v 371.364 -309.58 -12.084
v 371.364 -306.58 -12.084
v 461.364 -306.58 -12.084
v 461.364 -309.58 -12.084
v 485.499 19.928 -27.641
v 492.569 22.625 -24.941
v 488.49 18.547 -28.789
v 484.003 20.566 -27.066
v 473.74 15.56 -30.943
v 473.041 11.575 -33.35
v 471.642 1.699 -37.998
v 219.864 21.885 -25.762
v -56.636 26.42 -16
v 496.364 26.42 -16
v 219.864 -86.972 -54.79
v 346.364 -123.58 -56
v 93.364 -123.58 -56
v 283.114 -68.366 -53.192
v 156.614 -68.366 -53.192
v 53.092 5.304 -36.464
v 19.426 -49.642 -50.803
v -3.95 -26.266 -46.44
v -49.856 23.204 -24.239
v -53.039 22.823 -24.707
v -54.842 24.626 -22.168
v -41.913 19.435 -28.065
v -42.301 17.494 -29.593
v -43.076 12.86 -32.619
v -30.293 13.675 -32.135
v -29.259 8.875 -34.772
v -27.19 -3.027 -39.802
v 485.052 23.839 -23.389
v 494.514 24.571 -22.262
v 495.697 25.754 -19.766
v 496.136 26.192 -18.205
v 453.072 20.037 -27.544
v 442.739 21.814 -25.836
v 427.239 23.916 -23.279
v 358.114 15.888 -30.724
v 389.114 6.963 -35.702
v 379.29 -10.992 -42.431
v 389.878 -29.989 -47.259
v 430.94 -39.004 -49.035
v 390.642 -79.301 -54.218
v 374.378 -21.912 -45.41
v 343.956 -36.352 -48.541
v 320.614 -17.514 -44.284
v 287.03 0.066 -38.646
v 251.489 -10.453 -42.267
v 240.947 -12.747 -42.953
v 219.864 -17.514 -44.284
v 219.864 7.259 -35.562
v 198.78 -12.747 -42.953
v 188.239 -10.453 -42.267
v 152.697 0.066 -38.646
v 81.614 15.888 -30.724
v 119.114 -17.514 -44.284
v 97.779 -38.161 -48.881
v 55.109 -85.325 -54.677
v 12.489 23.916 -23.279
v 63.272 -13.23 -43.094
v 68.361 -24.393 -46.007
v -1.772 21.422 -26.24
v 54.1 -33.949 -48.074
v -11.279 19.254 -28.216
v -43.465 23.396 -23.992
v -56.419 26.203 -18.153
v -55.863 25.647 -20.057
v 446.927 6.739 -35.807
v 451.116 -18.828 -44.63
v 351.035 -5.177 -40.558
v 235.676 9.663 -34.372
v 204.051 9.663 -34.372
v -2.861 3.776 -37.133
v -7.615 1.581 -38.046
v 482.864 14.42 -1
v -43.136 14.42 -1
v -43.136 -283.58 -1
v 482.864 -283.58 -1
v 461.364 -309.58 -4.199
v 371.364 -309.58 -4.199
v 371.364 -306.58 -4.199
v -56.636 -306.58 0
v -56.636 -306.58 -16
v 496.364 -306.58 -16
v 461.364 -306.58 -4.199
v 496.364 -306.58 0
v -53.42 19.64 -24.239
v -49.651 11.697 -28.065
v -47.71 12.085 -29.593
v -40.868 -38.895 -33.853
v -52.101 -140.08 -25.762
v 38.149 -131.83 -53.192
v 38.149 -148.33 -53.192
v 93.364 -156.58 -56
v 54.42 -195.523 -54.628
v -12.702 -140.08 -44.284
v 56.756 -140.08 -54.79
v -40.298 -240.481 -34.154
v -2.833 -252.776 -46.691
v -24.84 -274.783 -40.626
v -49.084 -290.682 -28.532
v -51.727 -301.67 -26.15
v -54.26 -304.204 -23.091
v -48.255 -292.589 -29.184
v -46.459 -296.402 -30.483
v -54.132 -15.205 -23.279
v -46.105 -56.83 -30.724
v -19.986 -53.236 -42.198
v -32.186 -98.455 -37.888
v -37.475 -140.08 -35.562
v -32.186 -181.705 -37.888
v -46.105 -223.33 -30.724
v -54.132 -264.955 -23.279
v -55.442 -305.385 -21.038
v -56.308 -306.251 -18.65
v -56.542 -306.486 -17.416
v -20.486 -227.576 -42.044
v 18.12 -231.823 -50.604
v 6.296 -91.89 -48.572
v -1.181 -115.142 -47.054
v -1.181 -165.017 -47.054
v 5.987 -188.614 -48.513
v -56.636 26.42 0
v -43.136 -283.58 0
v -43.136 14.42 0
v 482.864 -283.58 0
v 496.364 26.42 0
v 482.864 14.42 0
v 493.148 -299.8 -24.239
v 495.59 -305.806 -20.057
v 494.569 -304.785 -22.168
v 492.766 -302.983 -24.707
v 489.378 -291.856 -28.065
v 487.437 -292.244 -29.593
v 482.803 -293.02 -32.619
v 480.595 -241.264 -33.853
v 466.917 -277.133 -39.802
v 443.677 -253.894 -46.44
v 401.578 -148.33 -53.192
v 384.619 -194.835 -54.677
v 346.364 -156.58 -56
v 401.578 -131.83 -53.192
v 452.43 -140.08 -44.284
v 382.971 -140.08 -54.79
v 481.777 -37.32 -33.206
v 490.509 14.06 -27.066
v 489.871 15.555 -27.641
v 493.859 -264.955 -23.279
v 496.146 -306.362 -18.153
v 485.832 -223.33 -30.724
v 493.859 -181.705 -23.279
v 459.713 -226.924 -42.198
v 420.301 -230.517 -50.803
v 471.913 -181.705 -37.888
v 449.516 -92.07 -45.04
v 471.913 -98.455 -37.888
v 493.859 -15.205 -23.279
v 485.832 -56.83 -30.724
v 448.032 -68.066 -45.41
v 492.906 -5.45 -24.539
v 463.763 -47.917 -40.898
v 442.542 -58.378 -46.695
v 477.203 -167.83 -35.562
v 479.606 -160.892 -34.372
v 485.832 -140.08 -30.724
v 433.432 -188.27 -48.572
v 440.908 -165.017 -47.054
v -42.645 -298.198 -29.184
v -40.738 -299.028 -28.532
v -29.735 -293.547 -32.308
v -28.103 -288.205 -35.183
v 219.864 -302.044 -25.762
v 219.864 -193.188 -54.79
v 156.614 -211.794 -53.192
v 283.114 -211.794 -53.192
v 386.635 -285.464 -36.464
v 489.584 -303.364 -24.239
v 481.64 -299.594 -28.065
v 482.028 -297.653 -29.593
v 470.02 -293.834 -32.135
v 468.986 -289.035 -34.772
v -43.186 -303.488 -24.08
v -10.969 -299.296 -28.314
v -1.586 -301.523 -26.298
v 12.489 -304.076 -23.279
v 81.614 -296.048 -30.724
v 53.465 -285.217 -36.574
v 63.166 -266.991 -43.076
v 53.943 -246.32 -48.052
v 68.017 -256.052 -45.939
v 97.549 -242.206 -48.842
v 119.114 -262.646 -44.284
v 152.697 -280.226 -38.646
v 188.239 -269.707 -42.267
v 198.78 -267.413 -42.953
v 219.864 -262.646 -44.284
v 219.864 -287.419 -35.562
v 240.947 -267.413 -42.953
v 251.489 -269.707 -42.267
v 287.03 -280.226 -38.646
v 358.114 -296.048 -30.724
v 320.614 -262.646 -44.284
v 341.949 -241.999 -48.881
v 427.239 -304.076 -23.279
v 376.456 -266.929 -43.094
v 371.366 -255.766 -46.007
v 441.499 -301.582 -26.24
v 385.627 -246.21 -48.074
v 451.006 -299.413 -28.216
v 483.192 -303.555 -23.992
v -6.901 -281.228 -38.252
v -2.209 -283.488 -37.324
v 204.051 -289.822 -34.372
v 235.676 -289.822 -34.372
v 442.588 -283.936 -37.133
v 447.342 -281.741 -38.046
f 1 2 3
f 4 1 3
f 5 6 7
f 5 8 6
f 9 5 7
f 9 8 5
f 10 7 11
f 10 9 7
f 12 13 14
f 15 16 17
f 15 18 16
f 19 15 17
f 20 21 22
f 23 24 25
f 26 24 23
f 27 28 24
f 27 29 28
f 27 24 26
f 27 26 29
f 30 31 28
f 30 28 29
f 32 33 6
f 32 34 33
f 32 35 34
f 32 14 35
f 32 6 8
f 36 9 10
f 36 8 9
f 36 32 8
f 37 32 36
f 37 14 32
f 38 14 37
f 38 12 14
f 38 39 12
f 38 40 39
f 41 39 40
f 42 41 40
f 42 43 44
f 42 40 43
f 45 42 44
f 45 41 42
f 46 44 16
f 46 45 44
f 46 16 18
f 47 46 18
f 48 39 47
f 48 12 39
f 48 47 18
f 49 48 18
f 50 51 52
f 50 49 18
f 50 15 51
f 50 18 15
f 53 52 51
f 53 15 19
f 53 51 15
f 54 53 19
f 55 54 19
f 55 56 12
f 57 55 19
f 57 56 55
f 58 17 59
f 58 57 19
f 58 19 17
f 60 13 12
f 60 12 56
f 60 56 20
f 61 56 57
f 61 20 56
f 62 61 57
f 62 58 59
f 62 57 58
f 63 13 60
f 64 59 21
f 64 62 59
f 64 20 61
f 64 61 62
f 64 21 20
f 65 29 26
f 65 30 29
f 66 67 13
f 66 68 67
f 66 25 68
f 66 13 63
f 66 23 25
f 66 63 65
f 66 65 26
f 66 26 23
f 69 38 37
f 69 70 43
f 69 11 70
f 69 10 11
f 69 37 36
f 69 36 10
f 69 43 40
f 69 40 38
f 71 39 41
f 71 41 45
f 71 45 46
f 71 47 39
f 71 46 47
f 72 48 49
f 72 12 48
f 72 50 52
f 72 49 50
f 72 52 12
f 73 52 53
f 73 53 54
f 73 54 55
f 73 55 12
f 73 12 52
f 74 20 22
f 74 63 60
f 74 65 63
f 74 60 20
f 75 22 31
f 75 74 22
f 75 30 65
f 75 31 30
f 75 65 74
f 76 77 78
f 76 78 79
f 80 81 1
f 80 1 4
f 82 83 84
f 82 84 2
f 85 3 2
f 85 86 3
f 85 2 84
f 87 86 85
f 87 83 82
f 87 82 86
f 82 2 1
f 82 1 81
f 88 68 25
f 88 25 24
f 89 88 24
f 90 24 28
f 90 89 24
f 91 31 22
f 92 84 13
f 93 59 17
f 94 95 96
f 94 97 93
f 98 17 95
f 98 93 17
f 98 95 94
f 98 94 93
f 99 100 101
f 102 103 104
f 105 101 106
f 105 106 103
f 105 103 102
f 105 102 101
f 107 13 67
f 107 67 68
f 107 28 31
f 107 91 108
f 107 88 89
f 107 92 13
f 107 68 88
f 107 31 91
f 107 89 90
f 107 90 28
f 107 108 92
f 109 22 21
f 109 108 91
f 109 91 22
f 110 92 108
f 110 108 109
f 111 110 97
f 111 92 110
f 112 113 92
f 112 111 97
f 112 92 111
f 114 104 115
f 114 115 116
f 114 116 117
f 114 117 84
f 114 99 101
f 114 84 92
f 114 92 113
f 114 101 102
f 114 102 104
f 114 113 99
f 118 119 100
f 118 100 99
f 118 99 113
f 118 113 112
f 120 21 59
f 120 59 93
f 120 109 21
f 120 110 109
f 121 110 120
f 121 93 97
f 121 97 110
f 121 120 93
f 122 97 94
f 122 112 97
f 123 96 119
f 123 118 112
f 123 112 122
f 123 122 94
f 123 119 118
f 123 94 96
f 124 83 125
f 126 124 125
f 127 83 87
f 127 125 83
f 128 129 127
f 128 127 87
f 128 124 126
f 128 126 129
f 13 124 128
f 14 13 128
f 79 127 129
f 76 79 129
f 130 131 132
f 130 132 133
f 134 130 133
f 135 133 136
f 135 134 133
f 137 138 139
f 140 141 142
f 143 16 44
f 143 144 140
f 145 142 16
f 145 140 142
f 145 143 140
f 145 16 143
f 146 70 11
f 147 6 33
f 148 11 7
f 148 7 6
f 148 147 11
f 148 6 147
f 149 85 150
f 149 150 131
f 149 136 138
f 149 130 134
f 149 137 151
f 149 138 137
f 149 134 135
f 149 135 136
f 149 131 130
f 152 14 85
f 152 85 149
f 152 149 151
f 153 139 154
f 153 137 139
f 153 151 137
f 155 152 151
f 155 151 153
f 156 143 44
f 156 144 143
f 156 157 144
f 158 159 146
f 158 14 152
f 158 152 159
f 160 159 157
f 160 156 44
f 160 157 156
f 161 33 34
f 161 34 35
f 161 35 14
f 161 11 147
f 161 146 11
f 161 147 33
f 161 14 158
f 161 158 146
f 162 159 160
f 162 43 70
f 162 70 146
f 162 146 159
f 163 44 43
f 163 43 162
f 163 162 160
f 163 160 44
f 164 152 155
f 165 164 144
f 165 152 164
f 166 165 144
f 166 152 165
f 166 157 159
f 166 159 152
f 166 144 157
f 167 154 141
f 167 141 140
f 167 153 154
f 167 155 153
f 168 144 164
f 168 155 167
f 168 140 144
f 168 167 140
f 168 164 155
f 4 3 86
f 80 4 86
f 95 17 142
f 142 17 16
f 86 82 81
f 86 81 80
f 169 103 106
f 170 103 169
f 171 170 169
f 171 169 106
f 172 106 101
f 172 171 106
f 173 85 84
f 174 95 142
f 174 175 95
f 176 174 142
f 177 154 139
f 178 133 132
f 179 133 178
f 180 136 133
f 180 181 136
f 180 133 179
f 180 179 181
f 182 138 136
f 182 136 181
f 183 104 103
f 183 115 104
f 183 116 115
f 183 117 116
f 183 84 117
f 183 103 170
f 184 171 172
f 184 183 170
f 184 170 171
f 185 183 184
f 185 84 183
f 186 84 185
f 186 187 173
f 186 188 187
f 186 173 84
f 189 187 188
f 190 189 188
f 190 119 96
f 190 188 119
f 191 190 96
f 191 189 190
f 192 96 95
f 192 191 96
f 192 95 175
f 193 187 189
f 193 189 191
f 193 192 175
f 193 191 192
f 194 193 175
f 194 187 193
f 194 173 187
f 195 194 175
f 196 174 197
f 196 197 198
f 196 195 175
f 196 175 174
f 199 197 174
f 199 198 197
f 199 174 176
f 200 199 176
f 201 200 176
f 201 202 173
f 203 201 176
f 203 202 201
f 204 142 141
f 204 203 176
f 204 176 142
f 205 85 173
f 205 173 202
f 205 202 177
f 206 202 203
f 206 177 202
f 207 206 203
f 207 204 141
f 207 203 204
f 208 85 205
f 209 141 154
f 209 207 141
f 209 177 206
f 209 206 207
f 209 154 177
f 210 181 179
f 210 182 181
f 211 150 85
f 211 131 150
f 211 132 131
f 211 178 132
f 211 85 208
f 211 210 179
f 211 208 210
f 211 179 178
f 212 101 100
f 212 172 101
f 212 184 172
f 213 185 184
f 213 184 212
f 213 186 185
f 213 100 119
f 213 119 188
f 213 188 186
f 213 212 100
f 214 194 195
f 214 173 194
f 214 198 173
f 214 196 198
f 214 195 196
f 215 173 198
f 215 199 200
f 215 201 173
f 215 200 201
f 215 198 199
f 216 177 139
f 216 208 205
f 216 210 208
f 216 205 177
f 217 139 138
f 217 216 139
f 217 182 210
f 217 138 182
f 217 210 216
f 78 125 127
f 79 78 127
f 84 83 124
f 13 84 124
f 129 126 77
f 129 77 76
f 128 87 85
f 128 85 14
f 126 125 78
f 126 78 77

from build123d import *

# Parameters (mm, degrees)
SKETCH_1_W          = 553
SKETCH_1_H          = 333
EXTRUDE_1_DEPTH     = 56
FILLET_1_SIZE       = 40
FILLET_1_SIZE_2     = 150
SKETCH_2_W          = 526
SKETCH_2_H          = 298
CUT_EXTRUDE_1_DEPTH = 1
SKETCH_3_W          = 90
SKETCH_3_H          = 7.88506372
EXTRUDE_2_DEPTH     = 3


with BuildPart() as part:
    # Эскиз1 → Бобышка-Вытянуть1 (new body)
    with BuildSketch(Plane.XY):
        with Locations((219.863599641, -140.079802513)):
            Rectangle(SKETCH_1_W, SKETCH_1_H)
    extrude(amount=-EXTRUDE_1_DEPTH)

    # Скругление1
    # an asymmetric fillet: 150, 40 mm, written as the material it takes off along each edge
    with BuildSketch(Plane(origin=(496.363599641, -306.579802513, -56), x_dir=(0, 0, 1), z_dir=(-1, 0, 0)), Plane(origin=(-56.636400359, 26.420197487, -56), x_dir=(0, 0, 1), z_dir=(1, 0, 0))) as fillet_1_piece_1:
        with BuildLine():
            Bezier((FILLET_1_SIZE, 0), (0, 0), (0, FILLET_1_SIZE_2), weights=[1, 0.707106781, 1])
            Line((0, FILLET_1_SIZE_2), (-3, 150))
            Line((-3, 150), (-3, -3))
            Line((-3, -3), (40, -3))
            Line((40, -3), (FILLET_1_SIZE, 0))
        make_face()
    extrude(amount=553, mode=Mode.SUBTRACT)
    with BuildSketch(Plane(origin=(-56.636400359, -306.579802513, -56), x_dir=(0, 0, 1), z_dir=(0, 1, 0)), Plane(origin=(496.363599641, 26.420197487, -56), x_dir=(0, 0, 1), z_dir=(0, -1, 0))) as fillet_1_piece_2:
        with BuildLine():
            Bezier((FILLET_1_SIZE, 0), (0, 0), (0, FILLET_1_SIZE_2), weights=[1, 0.707106781, 1])
            Line((0, FILLET_1_SIZE_2), (-3, 150))
            Line((-3, 150), (-3, -3))
            Line((-3, -3), (40, -3))
            Line((40, -3), (FILLET_1_SIZE, 0))
        make_face()
    extrude(amount=333, mode=Mode.SUBTRACT)
    with BuildSketch(Plane(origin=(496.363599641, 26.420197487, -56), x_dir=(0, 0, 1), z_dir=(0, -1, 0))) as fillet_1_piece_3a_section:
        with BuildLine():
            Bezier((FILLET_1_SIZE, 0), (0, 0), (0, FILLET_1_SIZE_2), weights=[1, 0.707106781, 1])
            Line((0, FILLET_1_SIZE_2), (-3, 150))
            Line((-3, 150), (-3, -3))
            Line((-3, -3), (40, -3))
            Line((40, -3), (FILLET_1_SIZE, 0))
        make_face()
    fillet_1_piece_3a = extrude(amount=708, mode=Mode.PRIVATE)
    fillet_1_piece_3a = split(fillet_1_piece_3a, bisect_by=Plane(origin=(455.274079594, -306.579802513, -48.919820082), z_dir=(0, -1, 0)), keep=Keep.TOP, mode=Mode.PRIVATE)
    with BuildSketch(Plane(origin=(871.363599641, -306.579802513, -56), x_dir=(0, 0, 1), z_dir=(-1, 0, 0))) as fillet_1_piece_3b_section:
        with BuildLine():
            Bezier((FILLET_1_SIZE, 0), (0, 0), (0, FILLET_1_SIZE_2), weights=[1, 0.707106781, 1])
            Line((0, FILLET_1_SIZE_2), (-3, 150))
            Line((-3, 150), (-3, -3))
            Line((-3, -3), (40, -3))
            Line((40, -3), (FILLET_1_SIZE, 0))
        make_face()
    fillet_1_piece_3b = extrude(amount=928, mode=Mode.PRIVATE)
    fillet_1_piece_3b = split(fillet_1_piece_3b, bisect_by=Plane(origin=(496.363599641, -265.490295874, -48.919826396), z_dir=(1, 0, 0)), keep=Keep.TOP, mode=Mode.PRIVATE)
    fillet_1_piece_3 = fillet_1_piece_3a & fillet_1_piece_3b
    add(fillet_1_piece_3, mode=Mode.SUBTRACT)
    with BuildSketch(Plane(origin=(496.363599641, -306.579802513, -56), x_dir=(0, 0, 1), z_dir=(-1, 0, 0))) as fillet_1_piece_4a_section:
        with BuildLine():
            Bezier((FILLET_1_SIZE, 0), (0, 0), (0, FILLET_1_SIZE_2), weights=[1, 0.707106781, 1])
            Line((0, FILLET_1_SIZE_2), (-3, 150))
            Line((-3, 150), (-3, -3))
            Line((-3, -3), (40, -3))
            Line((40, -3), (FILLET_1_SIZE, 0))
        make_face()
    fillet_1_piece_4a = extrude(amount=928, mode=Mode.PRIVATE)
    fillet_1_piece_4a = split(fillet_1_piece_4a, bisect_by=Plane(origin=(-56.636400359, -265.49028305, -48.919819953), z_dir=(-1, 0, 0)), keep=Keep.TOP, mode=Mode.PRIVATE)
    with BuildSketch(Plane(origin=(-56.636400359, -681.579802513, -56), x_dir=(0, 0, 1), z_dir=(0, 1, 0))) as fillet_1_piece_4b_section:
        with BuildLine():
            Bezier((FILLET_1_SIZE, 0), (0, 0), (0, FILLET_1_SIZE_2), weights=[1, 0.707106781, 1])
            Line((0, FILLET_1_SIZE_2), (-3, 150))
            Line((-3, 150), (-3, -3))
            Line((-3, -3), (40, -3))
            Line((40, -3), (FILLET_1_SIZE, 0))
        make_face()
    fillet_1_piece_4b = extrude(amount=708, mode=Mode.PRIVATE)
    fillet_1_piece_4b = split(fillet_1_piece_4b, bisect_by=Plane(origin=(-15.546893136, -306.579802513, -48.919826525), z_dir=(0, -1, 0)), keep=Keep.TOP, mode=Mode.PRIVATE)
    fillet_1_piece_4 = fillet_1_piece_4a & fillet_1_piece_4b
    add(fillet_1_piece_4, mode=Mode.SUBTRACT)
    with BuildSketch(Plane(origin=(-431.636400359, 26.420197487, -56), x_dir=(0, 0, 1), z_dir=(1, 0, 0))) as fillet_1_piece_5a_section:
        with BuildLine():
            Bezier((FILLET_1_SIZE, 0), (0, 0), (0, FILLET_1_SIZE_2), weights=[1, 0.707106781, 1])
            Line((0, FILLET_1_SIZE_2), (-3, 150))
            Line((-3, 150), (-3, -3))
            Line((-3, -3), (40, -3))
            Line((40, -3), (FILLET_1_SIZE, 0))
        make_face()
    fillet_1_piece_5a = extrude(amount=928, mode=Mode.PRIVATE)
    fillet_1_piece_5a = split(fillet_1_piece_5a, bisect_by=Plane(origin=(-56.636400359, -14.669309261, -48.919826397), z_dir=(-1, 0, 0)), keep=Keep.TOP, mode=Mode.PRIVATE)
    with BuildSketch(Plane(origin=(-56.636400359, -306.579802513, -56), x_dir=(0, 0, 1), z_dir=(0, 1, 0))) as fillet_1_piece_5b_section:
        with BuildLine():
            Bezier((FILLET_1_SIZE, 0), (0, 0), (0, FILLET_1_SIZE_2), weights=[1, 0.707106781, 1])
            Line((0, FILLET_1_SIZE_2), (-3, 150))
            Line((-3, 150), (-3, -3))
            Line((-3, -3), (40, -3))
            Line((40, -3), (FILLET_1_SIZE, 0))
        make_face()
    fillet_1_piece_5b = extrude(amount=708, mode=Mode.PRIVATE)
    fillet_1_piece_5b = split(fillet_1_piece_5b, bisect_by=Plane(origin=(-15.546880312, 26.420197487, -48.919820082), z_dir=(0, 1, 0)), keep=Keep.TOP, mode=Mode.PRIVATE)
    fillet_1_piece_5 = fillet_1_piece_5a & fillet_1_piece_5b
    add(fillet_1_piece_5, mode=Mode.SUBTRACT)
    with BuildSketch(Plane(origin=(-56.636400359, 26.420197487, -56), x_dir=(0, 0, 1), z_dir=(1, 0, 0))) as fillet_1_piece_6a_section:
        with BuildLine():
            Bezier((FILLET_1_SIZE, 0), (0, 0), (0, FILLET_1_SIZE_2), weights=[1, 0.707106781, 1])
            Line((0, FILLET_1_SIZE_2), (-3, 150))
            Line((-3, 150), (-3, -3))
            Line((-3, -3), (40, -3))
            Line((40, -3), (FILLET_1_SIZE, 0))
        make_face()
    fillet_1_piece_6a = extrude(amount=928, mode=Mode.PRIVATE)
    fillet_1_piece_6a = split(fillet_1_piece_6a, bisect_by=Plane(origin=(496.363599641, -14.669322085, -48.919819954), z_dir=(1, 0, 0)), keep=Keep.TOP, mode=Mode.PRIVATE)
    with BuildSketch(Plane(origin=(496.363599641, 401.420197487, -56), x_dir=(0, 0, 1), z_dir=(0, -1, 0))) as fillet_1_piece_6b_section:
        with BuildLine():
            Bezier((FILLET_1_SIZE, 0), (0, 0), (0, FILLET_1_SIZE_2), weights=[1, 0.707106781, 1])
            Line((0, FILLET_1_SIZE_2), (-3, 150))
            Line((-3, 150), (-3, -3))
            Line((-3, -3), (40, -3))
            Line((40, -3), (FILLET_1_SIZE, 0))
        make_face()
    fillet_1_piece_6b = extrude(amount=708, mode=Mode.PRIVATE)
    fillet_1_piece_6b = split(fillet_1_piece_6b, bisect_by=Plane(origin=(455.274092417, 26.420197487, -48.919826525), z_dir=(0, 1, 0)), keep=Keep.TOP, mode=Mode.PRIVATE)
    fillet_1_piece_6 = fillet_1_piece_6a & fillet_1_piece_6b
    add(fillet_1_piece_6, mode=Mode.SUBTRACT)

    # Эскиз2 → Вырез-Вытянуть1 (cut)
    with BuildSketch(Plane.XY):
        with Locations((219.863599641, -134.579802513)):
            Rectangle(SKETCH_2_W, SKETCH_2_H)
    extrude(amount=-CUT_EXTRUDE_1_DEPTH, mode=Mode.SUBTRACT)

    # Эскиз3 → Бобышка-Вытянуть2 (add)
    with BuildSketch(Plane.XZ.offset(306.579802513)):
        with Locations((416.363599641, -8.14121692)):
            Rectangle(SKETCH_3_W, SKETCH_3_H)
    extrude(amount=EXTRUDE_2_DEPTH)


solid = part.part
